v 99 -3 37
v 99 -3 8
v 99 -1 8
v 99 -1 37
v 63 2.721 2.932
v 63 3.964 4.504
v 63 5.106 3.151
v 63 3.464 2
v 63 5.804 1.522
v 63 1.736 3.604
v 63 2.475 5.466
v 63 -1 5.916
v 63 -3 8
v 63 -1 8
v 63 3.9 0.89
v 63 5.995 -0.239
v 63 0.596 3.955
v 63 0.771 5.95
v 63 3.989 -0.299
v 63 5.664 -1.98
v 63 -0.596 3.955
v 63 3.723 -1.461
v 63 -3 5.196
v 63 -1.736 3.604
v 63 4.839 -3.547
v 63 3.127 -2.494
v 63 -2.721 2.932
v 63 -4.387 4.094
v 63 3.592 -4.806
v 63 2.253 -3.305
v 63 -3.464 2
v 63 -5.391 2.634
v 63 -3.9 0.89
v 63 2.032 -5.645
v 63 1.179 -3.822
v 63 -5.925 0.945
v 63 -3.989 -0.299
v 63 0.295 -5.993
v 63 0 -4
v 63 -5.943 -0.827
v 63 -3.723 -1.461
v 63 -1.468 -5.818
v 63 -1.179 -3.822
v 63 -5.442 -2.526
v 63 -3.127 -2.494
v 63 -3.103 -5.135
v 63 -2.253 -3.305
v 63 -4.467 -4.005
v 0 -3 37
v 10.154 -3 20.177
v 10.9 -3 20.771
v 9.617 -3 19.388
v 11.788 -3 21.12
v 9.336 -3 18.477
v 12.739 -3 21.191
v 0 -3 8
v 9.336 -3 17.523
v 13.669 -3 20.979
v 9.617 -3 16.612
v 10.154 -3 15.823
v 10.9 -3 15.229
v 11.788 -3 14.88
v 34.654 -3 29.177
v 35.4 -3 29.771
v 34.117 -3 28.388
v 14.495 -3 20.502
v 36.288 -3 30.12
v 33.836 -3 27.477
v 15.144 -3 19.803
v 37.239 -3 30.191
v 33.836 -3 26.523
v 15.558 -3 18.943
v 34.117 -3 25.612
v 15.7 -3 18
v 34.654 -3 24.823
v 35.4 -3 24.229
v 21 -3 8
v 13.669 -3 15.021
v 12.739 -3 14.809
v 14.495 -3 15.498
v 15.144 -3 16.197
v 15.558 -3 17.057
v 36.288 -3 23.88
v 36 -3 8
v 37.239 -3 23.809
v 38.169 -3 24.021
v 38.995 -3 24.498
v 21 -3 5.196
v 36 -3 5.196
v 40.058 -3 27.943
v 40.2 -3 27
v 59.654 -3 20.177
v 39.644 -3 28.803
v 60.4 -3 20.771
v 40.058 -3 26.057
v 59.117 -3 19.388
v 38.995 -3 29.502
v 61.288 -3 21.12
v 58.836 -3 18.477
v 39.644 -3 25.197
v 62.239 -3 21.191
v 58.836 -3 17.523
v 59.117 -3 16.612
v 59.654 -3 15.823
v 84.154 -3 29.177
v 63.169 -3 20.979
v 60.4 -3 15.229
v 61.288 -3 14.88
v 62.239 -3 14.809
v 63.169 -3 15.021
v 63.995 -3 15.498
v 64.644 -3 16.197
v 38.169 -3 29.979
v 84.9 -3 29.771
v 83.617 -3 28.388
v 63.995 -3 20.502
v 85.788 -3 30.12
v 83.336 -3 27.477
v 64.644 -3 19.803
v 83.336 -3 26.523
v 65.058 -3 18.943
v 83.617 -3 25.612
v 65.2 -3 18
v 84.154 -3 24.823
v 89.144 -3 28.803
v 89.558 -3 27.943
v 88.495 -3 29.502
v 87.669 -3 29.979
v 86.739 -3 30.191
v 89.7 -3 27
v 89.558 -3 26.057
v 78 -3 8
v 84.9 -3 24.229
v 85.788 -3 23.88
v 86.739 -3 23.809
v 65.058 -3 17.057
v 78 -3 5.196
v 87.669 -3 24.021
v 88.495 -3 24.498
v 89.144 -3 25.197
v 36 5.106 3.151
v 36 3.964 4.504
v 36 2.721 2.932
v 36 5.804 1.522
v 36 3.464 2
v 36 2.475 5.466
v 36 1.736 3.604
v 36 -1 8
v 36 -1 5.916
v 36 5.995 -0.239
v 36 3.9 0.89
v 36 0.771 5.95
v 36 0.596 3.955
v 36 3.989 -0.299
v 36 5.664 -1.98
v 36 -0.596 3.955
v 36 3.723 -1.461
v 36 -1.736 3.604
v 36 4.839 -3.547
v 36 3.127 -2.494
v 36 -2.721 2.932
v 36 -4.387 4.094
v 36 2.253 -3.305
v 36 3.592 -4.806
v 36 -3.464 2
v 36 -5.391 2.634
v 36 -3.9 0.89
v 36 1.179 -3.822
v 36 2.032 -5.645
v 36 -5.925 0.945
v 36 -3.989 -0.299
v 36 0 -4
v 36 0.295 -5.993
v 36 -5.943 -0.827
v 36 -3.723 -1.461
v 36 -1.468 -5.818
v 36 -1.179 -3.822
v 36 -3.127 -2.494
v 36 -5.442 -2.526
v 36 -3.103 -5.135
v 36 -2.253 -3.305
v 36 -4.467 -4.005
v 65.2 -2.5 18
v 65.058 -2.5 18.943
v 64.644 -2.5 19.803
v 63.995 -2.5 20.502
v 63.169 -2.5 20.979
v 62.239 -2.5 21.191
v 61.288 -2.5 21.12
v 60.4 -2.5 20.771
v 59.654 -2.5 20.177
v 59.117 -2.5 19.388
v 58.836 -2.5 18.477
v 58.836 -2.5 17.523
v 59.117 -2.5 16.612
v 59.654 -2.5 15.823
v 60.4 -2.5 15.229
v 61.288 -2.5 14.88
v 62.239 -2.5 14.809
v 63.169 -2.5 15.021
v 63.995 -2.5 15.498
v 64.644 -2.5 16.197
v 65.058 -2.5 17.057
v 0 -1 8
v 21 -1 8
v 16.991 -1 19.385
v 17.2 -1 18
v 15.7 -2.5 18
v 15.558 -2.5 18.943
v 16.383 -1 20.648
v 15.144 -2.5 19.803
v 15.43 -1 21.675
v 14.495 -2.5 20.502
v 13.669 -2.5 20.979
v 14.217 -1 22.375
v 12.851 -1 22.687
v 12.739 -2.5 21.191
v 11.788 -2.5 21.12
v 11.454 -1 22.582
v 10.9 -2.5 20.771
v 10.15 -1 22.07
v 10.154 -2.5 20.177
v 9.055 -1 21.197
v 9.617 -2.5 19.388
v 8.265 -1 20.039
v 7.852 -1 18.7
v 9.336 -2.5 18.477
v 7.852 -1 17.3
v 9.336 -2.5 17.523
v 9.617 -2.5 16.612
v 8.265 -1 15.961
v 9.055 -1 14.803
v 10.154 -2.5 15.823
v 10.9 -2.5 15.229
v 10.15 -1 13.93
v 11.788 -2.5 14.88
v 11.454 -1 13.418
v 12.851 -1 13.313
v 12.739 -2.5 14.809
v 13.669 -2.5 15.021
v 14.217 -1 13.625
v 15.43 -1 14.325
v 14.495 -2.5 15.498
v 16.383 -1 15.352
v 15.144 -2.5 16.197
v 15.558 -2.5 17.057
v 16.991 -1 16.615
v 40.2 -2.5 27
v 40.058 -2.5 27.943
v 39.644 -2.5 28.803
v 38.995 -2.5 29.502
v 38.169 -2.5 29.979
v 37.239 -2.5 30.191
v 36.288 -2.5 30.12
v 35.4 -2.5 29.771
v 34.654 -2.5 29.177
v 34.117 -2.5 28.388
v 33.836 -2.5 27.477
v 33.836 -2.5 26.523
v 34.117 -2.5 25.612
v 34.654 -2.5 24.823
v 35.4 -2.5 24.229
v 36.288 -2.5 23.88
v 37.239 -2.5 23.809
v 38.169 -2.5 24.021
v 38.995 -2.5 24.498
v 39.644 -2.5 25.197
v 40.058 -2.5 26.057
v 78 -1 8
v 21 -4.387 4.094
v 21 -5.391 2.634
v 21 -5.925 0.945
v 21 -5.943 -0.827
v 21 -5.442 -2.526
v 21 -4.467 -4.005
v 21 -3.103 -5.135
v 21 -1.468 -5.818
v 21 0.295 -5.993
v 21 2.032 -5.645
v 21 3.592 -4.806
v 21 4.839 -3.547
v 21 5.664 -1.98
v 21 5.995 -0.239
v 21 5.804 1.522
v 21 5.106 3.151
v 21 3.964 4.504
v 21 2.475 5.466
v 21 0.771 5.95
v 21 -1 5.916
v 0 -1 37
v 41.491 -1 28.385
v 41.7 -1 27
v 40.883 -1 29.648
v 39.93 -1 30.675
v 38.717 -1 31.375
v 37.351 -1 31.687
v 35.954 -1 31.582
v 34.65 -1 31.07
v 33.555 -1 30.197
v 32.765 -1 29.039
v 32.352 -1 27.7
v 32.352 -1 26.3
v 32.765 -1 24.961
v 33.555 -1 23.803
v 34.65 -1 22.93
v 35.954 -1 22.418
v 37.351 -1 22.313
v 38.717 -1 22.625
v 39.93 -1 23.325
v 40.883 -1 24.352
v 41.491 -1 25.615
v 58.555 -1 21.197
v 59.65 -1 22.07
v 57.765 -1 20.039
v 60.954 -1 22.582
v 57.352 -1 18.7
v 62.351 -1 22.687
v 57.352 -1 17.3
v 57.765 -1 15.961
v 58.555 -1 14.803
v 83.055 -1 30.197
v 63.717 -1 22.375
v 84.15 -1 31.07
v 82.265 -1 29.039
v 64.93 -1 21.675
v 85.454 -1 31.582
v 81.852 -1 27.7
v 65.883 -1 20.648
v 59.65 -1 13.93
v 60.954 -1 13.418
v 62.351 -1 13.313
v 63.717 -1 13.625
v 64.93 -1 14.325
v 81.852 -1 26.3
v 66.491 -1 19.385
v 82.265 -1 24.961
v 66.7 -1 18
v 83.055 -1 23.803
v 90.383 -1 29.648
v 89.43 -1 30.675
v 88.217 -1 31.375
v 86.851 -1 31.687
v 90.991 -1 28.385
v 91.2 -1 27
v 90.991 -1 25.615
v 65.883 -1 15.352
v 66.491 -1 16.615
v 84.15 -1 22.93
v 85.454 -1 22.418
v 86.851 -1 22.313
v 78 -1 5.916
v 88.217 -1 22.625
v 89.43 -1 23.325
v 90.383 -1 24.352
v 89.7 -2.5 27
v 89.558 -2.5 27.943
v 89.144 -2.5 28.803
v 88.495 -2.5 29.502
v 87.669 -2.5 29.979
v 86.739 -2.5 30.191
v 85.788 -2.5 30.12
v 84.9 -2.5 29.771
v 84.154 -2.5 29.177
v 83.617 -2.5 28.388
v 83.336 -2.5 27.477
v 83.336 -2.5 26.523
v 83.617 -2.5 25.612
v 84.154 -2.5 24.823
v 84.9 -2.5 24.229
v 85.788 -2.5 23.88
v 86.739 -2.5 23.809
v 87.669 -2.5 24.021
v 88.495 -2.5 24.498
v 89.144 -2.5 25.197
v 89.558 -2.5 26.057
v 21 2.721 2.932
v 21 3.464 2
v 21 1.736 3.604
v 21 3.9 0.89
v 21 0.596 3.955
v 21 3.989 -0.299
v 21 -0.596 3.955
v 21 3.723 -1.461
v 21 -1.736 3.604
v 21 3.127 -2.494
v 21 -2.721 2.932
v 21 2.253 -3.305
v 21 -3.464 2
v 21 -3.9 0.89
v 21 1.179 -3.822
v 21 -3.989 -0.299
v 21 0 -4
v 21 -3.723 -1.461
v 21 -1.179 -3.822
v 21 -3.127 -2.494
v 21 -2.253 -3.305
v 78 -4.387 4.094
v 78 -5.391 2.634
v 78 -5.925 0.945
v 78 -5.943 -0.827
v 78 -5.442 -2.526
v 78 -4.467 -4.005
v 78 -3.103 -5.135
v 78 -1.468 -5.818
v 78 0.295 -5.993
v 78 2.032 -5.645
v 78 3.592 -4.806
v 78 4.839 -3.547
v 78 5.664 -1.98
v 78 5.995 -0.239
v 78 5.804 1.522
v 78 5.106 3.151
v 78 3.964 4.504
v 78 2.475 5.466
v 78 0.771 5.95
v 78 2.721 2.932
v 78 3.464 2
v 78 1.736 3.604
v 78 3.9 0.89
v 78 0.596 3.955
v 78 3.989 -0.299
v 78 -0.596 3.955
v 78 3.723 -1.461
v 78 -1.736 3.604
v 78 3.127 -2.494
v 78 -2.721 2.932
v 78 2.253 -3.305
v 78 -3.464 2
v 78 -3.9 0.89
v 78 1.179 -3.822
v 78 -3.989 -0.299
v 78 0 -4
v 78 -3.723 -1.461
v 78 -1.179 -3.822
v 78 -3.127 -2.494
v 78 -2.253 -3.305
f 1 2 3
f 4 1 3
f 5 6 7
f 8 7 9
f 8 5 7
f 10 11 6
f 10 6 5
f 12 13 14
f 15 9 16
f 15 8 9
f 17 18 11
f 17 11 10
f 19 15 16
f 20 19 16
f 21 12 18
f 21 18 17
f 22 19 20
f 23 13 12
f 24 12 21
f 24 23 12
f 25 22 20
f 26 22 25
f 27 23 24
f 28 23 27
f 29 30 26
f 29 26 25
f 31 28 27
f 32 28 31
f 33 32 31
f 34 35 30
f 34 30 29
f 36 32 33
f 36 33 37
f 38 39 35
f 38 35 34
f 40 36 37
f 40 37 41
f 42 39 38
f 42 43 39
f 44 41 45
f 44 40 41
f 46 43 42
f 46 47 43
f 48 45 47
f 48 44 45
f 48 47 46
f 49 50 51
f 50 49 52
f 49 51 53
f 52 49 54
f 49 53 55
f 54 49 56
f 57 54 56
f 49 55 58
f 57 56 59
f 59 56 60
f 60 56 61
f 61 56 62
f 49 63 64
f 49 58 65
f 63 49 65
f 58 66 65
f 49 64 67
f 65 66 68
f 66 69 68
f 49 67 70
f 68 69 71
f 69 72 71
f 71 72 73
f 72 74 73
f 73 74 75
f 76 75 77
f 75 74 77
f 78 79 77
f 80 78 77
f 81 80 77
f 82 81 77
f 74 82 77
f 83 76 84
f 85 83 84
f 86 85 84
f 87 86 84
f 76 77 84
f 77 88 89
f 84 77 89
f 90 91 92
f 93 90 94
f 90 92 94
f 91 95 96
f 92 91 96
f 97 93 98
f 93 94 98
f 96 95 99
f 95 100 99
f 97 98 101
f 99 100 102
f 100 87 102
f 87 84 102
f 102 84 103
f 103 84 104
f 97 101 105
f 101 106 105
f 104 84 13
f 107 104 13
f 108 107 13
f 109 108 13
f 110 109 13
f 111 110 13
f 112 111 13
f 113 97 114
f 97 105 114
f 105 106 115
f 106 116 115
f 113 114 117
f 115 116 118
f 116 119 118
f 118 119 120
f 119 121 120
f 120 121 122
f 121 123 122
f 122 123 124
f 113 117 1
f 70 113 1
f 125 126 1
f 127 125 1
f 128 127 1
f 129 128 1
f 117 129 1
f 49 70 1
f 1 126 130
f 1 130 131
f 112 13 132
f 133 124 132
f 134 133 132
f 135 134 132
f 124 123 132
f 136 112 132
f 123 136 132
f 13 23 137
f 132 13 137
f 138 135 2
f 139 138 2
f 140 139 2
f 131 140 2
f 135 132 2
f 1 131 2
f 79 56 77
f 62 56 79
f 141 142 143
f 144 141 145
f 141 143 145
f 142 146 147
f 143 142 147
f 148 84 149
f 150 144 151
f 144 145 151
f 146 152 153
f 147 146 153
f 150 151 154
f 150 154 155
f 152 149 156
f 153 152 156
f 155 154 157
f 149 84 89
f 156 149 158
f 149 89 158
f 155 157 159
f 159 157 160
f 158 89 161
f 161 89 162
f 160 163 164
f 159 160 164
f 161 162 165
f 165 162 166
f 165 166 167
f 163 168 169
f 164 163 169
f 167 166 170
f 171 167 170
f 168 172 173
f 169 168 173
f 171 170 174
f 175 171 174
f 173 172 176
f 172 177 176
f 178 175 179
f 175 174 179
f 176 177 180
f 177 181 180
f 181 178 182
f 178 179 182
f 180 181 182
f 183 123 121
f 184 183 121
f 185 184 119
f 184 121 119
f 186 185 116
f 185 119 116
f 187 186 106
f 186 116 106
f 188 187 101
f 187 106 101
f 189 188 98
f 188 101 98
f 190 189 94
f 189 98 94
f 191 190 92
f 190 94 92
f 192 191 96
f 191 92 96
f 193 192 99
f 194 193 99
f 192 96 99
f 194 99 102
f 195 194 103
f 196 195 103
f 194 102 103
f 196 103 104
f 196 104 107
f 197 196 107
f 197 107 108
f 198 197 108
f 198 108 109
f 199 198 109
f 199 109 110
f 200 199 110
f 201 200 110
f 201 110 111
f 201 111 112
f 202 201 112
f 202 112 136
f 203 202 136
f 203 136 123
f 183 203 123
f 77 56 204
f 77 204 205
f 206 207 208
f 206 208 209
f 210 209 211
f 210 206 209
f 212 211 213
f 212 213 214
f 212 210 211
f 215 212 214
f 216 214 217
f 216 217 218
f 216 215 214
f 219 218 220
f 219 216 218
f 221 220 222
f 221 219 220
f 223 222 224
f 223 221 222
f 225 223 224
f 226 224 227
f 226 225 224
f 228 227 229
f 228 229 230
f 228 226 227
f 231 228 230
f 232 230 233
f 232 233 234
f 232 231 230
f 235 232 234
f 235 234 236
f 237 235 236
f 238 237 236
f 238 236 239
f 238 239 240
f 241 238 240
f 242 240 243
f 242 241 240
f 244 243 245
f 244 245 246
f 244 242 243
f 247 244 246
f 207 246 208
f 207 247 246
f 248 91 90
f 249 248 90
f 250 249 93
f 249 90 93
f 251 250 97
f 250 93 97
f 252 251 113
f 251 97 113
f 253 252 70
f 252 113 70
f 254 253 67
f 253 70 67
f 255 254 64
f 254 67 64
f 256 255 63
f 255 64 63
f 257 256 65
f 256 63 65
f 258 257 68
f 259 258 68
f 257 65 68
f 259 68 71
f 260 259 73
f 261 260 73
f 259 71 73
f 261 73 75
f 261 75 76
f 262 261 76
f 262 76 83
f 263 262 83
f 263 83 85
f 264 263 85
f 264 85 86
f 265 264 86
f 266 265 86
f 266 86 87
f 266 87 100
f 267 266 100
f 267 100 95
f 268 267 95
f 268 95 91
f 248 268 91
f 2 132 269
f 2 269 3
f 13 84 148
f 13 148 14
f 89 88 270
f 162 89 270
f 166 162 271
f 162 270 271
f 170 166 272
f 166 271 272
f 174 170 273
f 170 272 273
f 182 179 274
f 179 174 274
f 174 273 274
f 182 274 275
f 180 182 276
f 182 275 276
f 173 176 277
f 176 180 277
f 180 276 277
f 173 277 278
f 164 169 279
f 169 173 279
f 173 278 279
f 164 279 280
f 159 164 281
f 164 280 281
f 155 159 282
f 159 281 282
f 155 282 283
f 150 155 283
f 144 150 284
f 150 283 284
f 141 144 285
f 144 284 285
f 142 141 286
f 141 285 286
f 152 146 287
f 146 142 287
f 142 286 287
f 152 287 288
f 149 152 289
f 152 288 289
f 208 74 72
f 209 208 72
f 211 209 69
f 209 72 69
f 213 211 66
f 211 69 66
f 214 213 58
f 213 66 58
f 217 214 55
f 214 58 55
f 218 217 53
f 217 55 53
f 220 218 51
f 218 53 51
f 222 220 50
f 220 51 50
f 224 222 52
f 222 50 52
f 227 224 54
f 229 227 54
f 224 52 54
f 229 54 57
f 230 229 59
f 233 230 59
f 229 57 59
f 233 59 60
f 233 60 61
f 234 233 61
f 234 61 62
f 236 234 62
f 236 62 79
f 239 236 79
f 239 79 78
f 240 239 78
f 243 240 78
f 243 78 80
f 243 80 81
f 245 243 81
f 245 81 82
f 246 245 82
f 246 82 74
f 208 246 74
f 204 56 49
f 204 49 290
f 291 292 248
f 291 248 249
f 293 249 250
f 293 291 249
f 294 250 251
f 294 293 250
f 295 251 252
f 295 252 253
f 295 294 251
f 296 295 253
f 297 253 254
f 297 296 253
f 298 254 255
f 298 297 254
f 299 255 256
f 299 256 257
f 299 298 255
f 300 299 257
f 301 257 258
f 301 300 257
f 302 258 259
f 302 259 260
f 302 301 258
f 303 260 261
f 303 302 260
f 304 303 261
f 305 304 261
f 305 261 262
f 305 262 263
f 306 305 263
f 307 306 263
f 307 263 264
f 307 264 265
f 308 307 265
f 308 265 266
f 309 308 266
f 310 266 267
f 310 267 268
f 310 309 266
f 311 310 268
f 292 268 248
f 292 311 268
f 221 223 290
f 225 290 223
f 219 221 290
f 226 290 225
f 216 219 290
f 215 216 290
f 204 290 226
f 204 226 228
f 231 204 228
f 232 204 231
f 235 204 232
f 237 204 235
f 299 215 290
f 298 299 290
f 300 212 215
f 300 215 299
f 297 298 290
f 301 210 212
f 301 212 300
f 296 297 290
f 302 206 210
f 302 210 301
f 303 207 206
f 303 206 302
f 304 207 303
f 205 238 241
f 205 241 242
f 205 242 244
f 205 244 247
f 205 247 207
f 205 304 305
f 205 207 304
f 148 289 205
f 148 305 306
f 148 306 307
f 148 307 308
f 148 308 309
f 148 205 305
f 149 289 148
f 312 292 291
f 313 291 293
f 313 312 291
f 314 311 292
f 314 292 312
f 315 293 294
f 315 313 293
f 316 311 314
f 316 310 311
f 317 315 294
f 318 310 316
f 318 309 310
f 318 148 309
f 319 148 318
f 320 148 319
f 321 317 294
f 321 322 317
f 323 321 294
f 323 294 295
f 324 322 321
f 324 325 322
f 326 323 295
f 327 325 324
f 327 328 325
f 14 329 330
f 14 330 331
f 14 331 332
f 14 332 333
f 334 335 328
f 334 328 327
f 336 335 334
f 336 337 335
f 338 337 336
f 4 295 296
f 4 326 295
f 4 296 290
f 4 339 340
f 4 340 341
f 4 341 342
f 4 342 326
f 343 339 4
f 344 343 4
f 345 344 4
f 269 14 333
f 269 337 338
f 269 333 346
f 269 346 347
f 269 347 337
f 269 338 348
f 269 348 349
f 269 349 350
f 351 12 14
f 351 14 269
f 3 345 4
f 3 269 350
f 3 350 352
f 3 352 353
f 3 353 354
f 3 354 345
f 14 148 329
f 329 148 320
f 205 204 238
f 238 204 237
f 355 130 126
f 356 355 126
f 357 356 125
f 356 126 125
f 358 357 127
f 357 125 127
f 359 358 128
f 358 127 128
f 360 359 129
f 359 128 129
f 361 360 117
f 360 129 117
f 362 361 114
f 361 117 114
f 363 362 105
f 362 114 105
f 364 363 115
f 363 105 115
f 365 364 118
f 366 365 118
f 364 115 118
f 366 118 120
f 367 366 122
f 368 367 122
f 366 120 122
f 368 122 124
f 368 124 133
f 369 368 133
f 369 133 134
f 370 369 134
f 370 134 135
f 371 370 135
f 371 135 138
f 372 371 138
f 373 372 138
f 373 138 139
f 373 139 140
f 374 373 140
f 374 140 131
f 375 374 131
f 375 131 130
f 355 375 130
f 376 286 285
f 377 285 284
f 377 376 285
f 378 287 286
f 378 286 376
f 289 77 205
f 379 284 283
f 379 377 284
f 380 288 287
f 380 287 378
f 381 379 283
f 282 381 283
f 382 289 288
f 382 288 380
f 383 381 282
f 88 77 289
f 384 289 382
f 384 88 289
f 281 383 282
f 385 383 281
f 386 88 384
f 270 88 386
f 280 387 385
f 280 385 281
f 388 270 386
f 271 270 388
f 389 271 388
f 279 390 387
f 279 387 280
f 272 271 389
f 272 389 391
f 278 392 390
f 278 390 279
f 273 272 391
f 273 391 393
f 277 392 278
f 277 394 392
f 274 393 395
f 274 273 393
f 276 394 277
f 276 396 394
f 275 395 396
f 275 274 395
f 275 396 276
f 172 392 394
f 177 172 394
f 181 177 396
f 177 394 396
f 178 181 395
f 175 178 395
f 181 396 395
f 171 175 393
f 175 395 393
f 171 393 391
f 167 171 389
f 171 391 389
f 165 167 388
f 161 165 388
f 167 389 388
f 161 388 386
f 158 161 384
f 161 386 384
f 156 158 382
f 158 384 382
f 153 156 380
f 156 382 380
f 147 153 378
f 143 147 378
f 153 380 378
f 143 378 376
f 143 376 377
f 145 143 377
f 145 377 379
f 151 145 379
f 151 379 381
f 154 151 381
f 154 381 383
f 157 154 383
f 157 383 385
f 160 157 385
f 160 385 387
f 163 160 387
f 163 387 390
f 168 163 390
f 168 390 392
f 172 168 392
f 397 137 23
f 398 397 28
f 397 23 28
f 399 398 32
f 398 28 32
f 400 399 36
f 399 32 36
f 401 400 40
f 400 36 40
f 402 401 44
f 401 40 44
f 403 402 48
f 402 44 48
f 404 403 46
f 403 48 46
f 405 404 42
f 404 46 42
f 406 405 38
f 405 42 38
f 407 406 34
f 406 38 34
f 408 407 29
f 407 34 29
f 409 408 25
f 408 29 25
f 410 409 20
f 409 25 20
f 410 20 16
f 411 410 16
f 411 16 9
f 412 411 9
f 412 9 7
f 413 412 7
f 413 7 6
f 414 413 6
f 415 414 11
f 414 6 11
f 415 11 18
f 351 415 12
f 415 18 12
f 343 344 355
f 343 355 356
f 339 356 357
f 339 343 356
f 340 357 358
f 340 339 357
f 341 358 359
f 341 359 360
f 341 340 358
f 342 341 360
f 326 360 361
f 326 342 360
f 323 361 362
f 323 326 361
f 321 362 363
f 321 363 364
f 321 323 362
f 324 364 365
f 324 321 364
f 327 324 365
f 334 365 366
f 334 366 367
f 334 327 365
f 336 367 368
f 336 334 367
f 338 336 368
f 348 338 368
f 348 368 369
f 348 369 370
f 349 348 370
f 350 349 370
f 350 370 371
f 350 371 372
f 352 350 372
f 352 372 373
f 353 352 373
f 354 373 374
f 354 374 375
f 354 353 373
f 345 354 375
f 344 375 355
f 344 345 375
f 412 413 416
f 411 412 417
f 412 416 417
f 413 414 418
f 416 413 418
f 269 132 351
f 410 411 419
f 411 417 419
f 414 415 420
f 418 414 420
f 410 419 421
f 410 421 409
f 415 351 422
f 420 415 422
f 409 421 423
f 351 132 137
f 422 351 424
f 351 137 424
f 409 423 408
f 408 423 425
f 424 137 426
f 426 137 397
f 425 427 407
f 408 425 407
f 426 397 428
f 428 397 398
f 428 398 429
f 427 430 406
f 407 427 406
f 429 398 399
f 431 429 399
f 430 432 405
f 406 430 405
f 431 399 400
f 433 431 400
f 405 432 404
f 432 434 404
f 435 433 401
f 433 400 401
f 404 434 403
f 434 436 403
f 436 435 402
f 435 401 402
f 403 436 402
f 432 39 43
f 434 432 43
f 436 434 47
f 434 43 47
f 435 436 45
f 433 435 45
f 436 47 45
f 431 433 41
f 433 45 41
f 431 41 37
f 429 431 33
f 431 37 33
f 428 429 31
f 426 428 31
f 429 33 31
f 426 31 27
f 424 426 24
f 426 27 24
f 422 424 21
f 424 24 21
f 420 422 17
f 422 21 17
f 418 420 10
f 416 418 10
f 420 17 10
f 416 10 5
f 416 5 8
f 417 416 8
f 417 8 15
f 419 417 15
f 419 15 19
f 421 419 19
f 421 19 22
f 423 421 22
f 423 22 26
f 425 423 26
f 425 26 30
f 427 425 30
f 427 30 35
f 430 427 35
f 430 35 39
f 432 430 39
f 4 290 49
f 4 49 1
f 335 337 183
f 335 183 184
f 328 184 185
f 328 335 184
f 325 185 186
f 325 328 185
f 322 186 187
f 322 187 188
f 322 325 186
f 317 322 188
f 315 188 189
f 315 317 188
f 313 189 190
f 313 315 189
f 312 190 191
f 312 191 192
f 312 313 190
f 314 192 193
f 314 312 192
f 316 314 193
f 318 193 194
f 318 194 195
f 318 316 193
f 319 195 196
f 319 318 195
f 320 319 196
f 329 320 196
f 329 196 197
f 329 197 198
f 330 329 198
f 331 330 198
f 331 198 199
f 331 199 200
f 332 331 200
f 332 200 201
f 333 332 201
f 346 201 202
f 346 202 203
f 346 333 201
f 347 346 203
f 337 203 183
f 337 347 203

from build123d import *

# Parameters (mm, degrees)
SKETCH_1_R               = 6
SKETCH_1_R_2             = 4
EXTRUDE_1_DEPTH          = 99
SKETCH_2_W               = 99
SKETCH_2_H               = 2
EXTRUDE_2_DEPTH          = 37
SKETCH_3_R               = 4
CUT_EXTRUDE_1_DEPTH      = 106.858395983
SKETCH_7_R               = 3.2
CUT_EXTRUDE_8_DEPTH      = 37
CUT_EXTRUDE_9_DEPTH      = 106.919780967
CUT_EXTRUDE_9_DEPTH_BACK = 106.919780967
SKETCH_8_W               = 21
SKETCH_8_H               = 14
SKETCH_8_W_2             = 27
CHAMFER_2_SIZE           = 1.5


with BuildPart() as part:
    # 草图1 → 凸台-拉伸1 (new body)
    with BuildSketch(Plane(origin=(0, 0, 0), x_dir=(0, 0, -1), z_dir=(1, 0, 0))):
        Circle(SKETCH_1_R)
        Circle(SKETCH_1_R_2, mode=Mode.SUBTRACT)
    extrude(amount=EXTRUDE_1_DEPTH)

    # 草图2 → 凸台-拉伸2 (add)
    with BuildSketch(Plane.XY):
        with Locations((49.5, -2)):
            Rectangle(SKETCH_2_W, SKETCH_2_H)
    extrude(amount=EXTRUDE_2_DEPTH)

    # 草图3 → 切除-拉伸1 (cut, through all)
    with BuildSketch(Plane.ZY):
        with Locations(Location((0, 0, 0), (0, 0, 180))):
            Circle(SKETCH_3_R)
    extrude(amount=-CUT_EXTRUDE_1_DEPTH, mode=Mode.SUBTRACT)

    # 草图7 → 切除-拉伸8 (cut)
    with BuildSketch(Plane.XZ.offset(3)):
        with Locations((12.5, 18)):
            Circle(SKETCH_7_R)
        with Locations((37, 27)):
            Circle(SKETCH_7_R)
        with Locations((62, 18)):
            Circle(SKETCH_7_R)
        with Locations((86.5, 27)):
            Circle(SKETCH_7_R)
    extrude(amount=-CUT_EXTRUDE_8_DEPTH, mode=Mode.SUBTRACT)

    # 草图8 → 切除-拉伸9 (cut, two sides: drawn at the far end of the back side and taken through both)
    with BuildSketch(Plane(origin=(0, -1, 0), x_dir=(1, 0, 0), z_dir=(0, 1, 0)).offset(-CUT_EXTRUDE_9_DEPTH_BACK)):
        with Locations((10.5, -1)):
            Rectangle(SKETCH_8_W, SKETCH_8_H)
        with Locations((49.5, -1)):
            Rectangle(SKETCH_8_W_2, SKETCH_8_H)
        with Locations((88.5, -1)):
            Rectangle(SKETCH_8_W, SKETCH_8_H)
    extrude(amount=CUT_EXTRUDE_9_DEPTH + CUT_EXTRUDE_9_DEPTH_BACK, mode=Mode.SUBTRACT)

    # 倒角2
    chamfer_2_edges = [part.edges().sort_by_distance(p)[0] for p in [
        (9.3, -1, 18),
        (33.8, -1, 27),
        (58.8, -1, 18),
        (83.3, -1, 27),
    ]]
    chamfer(chamfer_2_edges, length=CHAMFER_2_SIZE)


solid = part.part
